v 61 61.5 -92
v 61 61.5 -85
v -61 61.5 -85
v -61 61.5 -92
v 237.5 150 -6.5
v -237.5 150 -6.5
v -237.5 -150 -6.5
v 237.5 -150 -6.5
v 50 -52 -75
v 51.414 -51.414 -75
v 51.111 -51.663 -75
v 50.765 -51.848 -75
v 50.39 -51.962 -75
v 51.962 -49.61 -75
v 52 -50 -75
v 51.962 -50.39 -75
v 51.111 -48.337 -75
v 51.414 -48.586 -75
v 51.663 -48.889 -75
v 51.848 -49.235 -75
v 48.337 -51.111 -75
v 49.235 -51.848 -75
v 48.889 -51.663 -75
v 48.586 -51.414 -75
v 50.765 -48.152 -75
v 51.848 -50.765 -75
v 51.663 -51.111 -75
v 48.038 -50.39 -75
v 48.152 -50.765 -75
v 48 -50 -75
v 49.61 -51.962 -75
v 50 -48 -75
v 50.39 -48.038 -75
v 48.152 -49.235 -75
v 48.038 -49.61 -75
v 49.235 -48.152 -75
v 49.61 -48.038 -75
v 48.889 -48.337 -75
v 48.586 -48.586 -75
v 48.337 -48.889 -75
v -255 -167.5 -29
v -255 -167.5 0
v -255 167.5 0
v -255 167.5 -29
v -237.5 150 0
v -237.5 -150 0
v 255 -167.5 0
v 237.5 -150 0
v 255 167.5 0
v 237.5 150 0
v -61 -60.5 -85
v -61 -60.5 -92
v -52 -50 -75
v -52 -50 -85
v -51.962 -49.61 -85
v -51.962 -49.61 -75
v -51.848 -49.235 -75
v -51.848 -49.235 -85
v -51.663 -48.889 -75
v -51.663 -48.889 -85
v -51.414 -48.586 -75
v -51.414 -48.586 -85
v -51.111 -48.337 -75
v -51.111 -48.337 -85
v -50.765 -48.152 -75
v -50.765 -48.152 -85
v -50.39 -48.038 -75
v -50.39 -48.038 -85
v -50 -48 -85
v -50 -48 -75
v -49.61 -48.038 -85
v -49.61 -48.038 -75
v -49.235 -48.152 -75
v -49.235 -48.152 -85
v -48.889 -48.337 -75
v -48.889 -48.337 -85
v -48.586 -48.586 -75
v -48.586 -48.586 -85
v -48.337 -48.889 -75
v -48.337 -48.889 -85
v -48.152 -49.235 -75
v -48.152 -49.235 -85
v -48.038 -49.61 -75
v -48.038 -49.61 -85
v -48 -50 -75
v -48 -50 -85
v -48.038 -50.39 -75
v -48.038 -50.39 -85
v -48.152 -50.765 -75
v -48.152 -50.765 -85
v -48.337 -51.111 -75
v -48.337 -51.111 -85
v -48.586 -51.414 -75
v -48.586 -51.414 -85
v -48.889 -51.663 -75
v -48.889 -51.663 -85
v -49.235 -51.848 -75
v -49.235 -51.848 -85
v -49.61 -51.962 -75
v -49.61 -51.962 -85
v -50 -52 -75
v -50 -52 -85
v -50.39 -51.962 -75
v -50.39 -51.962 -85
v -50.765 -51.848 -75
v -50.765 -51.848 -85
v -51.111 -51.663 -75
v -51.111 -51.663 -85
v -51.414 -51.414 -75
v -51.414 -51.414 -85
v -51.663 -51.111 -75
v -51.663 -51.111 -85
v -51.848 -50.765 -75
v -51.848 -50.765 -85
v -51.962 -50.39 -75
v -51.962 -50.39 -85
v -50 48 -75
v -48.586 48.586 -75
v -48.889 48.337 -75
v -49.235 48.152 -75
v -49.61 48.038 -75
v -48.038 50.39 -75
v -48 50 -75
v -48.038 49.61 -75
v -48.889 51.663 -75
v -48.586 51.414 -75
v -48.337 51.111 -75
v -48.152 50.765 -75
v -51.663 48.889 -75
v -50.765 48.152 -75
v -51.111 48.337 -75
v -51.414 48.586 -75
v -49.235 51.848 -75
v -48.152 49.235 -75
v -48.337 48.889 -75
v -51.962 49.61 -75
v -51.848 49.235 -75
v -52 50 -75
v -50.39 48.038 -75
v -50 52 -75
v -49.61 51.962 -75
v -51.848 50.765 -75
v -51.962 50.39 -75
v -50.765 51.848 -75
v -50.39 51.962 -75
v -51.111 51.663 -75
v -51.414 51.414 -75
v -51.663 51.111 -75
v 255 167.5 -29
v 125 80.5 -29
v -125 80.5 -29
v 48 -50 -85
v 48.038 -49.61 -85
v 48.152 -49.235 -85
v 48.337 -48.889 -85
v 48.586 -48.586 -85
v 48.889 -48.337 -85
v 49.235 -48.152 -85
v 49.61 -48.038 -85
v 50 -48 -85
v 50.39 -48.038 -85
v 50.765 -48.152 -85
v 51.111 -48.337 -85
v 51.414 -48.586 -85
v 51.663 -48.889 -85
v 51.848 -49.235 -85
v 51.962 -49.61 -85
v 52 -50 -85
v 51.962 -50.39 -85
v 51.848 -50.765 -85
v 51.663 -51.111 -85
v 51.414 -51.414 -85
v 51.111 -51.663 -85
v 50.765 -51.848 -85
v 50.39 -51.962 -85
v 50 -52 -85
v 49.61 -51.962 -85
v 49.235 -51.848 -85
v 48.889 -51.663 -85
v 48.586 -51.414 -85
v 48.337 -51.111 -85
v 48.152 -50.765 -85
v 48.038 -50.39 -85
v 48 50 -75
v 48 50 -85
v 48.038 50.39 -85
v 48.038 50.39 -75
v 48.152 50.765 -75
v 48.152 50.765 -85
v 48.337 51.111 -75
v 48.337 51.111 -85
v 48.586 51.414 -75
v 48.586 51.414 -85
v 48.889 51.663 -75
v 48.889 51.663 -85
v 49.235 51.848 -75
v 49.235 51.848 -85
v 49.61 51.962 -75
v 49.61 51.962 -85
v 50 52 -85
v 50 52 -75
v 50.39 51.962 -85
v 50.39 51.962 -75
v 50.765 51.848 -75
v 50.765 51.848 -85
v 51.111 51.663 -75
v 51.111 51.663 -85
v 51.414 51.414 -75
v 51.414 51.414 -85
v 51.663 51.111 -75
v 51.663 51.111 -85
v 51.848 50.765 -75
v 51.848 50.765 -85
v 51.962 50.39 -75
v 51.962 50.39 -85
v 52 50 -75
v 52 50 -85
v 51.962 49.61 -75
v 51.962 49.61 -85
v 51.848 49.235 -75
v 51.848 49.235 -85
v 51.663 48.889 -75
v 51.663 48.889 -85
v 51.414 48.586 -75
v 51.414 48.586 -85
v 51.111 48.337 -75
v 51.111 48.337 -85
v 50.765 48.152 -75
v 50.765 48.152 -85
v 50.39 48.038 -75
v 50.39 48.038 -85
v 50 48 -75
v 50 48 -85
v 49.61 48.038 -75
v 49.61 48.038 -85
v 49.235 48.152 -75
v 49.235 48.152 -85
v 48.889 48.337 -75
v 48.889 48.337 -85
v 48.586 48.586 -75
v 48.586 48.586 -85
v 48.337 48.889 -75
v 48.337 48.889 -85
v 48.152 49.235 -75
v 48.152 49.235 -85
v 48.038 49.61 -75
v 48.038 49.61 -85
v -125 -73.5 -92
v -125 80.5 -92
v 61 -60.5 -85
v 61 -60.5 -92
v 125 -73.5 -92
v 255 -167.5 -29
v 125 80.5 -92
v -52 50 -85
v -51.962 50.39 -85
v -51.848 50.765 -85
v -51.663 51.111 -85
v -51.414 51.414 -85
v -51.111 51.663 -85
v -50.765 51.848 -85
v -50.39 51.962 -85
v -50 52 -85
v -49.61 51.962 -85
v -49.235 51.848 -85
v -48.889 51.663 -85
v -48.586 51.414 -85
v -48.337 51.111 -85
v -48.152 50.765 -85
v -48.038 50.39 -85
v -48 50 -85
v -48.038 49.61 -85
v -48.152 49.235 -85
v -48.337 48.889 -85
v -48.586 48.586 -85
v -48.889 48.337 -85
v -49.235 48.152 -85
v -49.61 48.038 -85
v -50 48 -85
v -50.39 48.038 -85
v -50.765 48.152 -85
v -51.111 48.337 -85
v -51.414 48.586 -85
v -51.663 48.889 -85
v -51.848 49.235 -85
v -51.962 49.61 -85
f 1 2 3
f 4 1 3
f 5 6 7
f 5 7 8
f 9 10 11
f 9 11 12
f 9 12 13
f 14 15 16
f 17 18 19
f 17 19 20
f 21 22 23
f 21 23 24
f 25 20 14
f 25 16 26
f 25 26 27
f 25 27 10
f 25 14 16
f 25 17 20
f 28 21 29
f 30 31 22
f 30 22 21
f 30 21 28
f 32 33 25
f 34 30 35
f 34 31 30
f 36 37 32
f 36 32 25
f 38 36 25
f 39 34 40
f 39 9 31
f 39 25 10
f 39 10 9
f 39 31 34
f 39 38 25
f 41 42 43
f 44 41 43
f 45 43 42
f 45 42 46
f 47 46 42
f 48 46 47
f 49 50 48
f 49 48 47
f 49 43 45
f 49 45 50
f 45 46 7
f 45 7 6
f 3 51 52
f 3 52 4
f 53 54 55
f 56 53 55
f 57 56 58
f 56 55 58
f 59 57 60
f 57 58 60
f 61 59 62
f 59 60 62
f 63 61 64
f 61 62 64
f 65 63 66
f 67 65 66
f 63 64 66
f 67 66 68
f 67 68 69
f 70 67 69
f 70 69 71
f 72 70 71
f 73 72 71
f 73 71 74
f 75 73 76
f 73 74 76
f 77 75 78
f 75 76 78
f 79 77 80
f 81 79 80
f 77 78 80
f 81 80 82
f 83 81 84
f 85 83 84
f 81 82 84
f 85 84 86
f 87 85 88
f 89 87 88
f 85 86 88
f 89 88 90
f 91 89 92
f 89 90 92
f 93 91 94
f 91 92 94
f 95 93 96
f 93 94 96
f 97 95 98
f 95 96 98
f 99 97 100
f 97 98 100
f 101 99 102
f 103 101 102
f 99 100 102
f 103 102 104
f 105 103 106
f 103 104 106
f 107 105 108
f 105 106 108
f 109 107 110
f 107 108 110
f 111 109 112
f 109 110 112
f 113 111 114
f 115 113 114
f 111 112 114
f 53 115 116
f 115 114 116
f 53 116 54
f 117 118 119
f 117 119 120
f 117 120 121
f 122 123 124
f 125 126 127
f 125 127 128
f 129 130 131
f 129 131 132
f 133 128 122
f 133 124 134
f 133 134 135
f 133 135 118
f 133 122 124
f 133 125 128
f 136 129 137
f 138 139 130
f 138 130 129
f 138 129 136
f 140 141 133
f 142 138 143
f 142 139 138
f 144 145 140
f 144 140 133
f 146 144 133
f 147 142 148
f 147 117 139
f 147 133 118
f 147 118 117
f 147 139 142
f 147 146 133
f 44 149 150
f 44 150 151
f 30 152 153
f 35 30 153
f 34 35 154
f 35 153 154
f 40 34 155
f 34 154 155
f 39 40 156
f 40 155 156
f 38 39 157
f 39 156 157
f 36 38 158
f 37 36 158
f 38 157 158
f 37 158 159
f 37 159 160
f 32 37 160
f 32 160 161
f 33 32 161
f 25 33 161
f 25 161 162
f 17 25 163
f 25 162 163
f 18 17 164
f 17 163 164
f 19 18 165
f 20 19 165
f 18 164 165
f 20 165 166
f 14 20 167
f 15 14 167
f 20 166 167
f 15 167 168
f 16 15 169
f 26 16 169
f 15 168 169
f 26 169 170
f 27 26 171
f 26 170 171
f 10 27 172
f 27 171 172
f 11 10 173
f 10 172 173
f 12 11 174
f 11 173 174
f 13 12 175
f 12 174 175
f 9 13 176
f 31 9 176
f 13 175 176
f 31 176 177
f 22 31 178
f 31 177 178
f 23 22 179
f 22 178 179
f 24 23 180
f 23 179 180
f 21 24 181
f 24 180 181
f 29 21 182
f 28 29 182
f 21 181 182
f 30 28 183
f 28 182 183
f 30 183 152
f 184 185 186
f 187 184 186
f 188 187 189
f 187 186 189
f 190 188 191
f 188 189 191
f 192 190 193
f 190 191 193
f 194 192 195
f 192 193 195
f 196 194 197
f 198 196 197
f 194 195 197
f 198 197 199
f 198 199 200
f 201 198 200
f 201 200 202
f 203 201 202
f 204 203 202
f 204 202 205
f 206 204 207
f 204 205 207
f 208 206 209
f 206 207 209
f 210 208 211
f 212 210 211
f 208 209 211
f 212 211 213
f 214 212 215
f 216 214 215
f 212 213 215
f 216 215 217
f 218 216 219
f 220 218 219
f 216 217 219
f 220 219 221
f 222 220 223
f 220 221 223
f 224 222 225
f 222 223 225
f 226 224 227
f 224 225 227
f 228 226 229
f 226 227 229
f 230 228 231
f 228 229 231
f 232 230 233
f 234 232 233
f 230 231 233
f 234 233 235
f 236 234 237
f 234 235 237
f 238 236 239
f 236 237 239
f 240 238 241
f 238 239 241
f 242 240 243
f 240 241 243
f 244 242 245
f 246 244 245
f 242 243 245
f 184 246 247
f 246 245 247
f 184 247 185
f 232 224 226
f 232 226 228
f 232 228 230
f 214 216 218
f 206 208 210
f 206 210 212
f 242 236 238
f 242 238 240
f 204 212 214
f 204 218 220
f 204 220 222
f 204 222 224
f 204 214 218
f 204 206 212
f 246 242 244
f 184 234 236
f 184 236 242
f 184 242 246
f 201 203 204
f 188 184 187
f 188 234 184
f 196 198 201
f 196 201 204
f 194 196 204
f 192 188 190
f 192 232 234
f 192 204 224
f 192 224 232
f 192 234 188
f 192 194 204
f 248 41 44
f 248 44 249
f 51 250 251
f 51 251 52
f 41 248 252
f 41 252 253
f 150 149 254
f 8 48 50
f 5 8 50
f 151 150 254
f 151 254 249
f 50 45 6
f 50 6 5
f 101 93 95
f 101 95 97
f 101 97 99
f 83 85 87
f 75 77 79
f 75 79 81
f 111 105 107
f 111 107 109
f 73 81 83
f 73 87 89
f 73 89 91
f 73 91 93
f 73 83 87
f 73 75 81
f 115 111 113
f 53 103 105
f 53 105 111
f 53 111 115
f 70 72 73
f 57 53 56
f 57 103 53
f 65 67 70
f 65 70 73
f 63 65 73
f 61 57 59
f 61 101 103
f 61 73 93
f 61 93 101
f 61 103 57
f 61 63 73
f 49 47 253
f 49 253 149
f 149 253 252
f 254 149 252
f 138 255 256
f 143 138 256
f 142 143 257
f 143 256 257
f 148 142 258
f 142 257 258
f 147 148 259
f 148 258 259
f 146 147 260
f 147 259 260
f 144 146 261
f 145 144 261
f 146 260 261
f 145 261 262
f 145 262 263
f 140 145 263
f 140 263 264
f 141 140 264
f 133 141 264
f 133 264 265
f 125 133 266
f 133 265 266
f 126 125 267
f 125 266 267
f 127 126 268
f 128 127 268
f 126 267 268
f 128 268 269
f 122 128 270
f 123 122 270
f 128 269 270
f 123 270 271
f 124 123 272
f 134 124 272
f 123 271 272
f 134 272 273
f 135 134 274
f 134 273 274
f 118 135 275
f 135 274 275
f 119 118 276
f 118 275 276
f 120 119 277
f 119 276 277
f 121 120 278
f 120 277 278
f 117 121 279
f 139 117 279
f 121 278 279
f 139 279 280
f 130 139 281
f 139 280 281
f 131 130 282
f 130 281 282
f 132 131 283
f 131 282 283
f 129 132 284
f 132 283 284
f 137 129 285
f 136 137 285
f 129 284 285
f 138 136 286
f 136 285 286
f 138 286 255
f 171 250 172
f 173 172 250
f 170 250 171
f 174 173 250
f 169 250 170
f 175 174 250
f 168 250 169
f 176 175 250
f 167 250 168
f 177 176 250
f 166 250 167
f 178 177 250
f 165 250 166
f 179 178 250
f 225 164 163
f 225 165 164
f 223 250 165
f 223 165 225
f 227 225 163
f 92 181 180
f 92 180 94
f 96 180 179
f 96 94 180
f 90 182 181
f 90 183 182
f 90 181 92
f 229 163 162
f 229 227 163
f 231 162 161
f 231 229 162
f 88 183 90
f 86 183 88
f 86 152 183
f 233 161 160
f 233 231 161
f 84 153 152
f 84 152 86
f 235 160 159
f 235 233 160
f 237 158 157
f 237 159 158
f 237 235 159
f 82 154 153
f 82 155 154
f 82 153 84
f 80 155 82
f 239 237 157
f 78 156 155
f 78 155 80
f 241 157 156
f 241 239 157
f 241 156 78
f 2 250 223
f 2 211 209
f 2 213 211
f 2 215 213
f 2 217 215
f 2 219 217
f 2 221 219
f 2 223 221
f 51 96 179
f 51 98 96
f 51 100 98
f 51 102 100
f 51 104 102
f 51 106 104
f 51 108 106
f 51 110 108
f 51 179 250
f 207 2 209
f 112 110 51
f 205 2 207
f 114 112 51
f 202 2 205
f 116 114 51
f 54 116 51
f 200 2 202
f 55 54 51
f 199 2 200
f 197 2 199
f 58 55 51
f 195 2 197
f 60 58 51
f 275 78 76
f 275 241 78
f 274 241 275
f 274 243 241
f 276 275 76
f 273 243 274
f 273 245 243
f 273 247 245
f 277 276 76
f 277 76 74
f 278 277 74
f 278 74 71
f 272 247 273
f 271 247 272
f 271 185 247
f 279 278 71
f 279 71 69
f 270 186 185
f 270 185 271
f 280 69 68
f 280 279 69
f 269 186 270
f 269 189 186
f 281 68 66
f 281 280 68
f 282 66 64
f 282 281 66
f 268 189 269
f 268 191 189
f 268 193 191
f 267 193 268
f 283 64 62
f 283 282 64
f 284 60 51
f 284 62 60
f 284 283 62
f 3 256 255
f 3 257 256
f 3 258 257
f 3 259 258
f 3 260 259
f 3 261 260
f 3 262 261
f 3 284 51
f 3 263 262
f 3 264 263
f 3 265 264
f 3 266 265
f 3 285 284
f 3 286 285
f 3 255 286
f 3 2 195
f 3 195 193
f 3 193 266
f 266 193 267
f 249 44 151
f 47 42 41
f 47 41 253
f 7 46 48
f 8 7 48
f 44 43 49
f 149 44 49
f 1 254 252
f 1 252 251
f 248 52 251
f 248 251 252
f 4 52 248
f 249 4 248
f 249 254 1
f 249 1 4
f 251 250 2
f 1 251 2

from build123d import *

# Parameters (mm, degrees)
SKETCH1_W           = 510
SKETCH1_H           = 335
BOSS_EXTRUDE1_DEPTH = 29
SKETCH2_W           = 475
SKETCH2_H           = 300
CUT_EXTRUDE1_DEPTH  = 6.5
SKETCH3_W           = 122
SKETCH3_H           = 122
BOSS_EXTRUDE2_DEPTH = 56
SKETCH4_R           = 2
CUT_EXTRUDE2_DEPTH  = 10
BOSS_EXTRUDE3_START = -56
SKETCH5_W           = 250
SKETCH5_H           = 154
SKETCH5_W_2         = 122
SKETCH5_H_2         = 122
BOSS_EXTRUDE3_DEPTH = 63
BOSS_EXTRUDE4_REACH = 360.798
BOSS_EXTRUDE5_REACH = 379.454
CUT_EXTRUDE3_DEPTH  = 63


with BuildPart() as part:
    # Sketch1 → Boss-Extrude1 (new body)
    with BuildSketch(Plane.XY):
        Rectangle(SKETCH1_W, SKETCH1_H)
    extrude(amount=-BOSS_EXTRUDE1_DEPTH)

    # Sketch2 → Cut-Extrude1 (cut)
    with BuildSketch(Plane.XY):
        Rectangle(SKETCH2_W, SKETCH2_H)
    extrude(amount=-CUT_EXTRUDE1_DEPTH, mode=Mode.SUBTRACT)

    # Sketch3 → Boss-Extrude2 (add)
    with BuildSketch(Plane(origin=(0, 0, -29), x_dir=(-1, 0, 0), z_dir=(0, 0, -1))):
        with Locations((0, 0.5)):
            Rectangle(SKETCH3_W, SKETCH3_H)
    extrude(amount=BOSS_EXTRUDE2_DEPTH)

    # Sketch4 → Cut-Extrude2 (cut)
    with BuildSketch(Plane(origin=(0, 0, -85), x_dir=(-1, 0, 0), z_dir=(0, 0, -1))):
        with Locations((-50, 50)):
            Circle(SKETCH4_R)
        with Locations((50, 50)):
            Circle(SKETCH4_R)
        with Locations((50, -50)):
            Circle(SKETCH4_R)
        with Locations((-50, -50)):
            Circle(SKETCH4_R)
    extrude(amount=-CUT_EXTRUDE2_DEPTH, mode=Mode.SUBTRACT)

    # Sketch5 → Boss-Extrude3 (add)
    with BuildSketch(Plane(origin=(0, 0, -85), x_dir=(-1, 0, 0), z_dir=(0, 0, -1)).offset(BOSS_EXTRUDE3_START)):
        with Locations((0, 3.5)):
            Rectangle(SKETCH5_W, SKETCH5_H)
        with Locations((0, 0.5)):
            Rectangle(SKETCH5_W_2, SKETCH5_H_2, mode=Mode.SUBTRACT)
    extrude(amount=BOSS_EXTRUDE3_DEPTH)

    # Sketch7 → Boss-Extrude4 (add, up to next)
    with BuildSketch(Plane(origin=(0, -65.329597813, -97.475907848), x_dir=(1, 0, 0), z_dir=(0, 0.55673786293741, 0.8306882399383573)), mode=Mode.PRIVATE) as boss_extrude4_sk1:
        Polygon((255, -122.994882164), (125, -9.835702245), (-125, -9.835702245), (-255, -122.994882164), align=None)
    boss_extrude4_tool1 = extrude(boss_extrude4_sk1.sketch, amount=BOSS_EXTRUDE4_REACH, mode=Mode.PRIVATE) - part.part
    add(boss_extrude4_tool1.solids().sort_by_distance((0, -125.859649, -56.907895))[0])

    # Sketch8 → Boss-Extrude5 (add, up to next)
    with BuildSketch(Plane(origin=(-59.87852796, 0, -123.558867219), x_dir=(0.8998964379962335, 0, -0.4361036584135601), z_dir=(0.4361036584135601, 0, 0.8998964379962335)), mode=Mode.PRIVATE) as boss_extrude5_sk1:
        Polygon((-216.826585595, 167.5), (-216.826585595, -167.5), (-72.365518175, -73.5), (-72.365518175, 80.5), align=None)
    boss_extrude5_tool1 = extrude(boss_extrude5_sk1.sketch, amount=BOSS_EXTRUDE5_REACH, mode=Mode.PRIVATE) - part.part
    boss_extrude5 = boss_extrude5_tool1.solids().sort_by_distance((-198.019768, 1.534083, -56.613497))[0]
    add(boss_extrude5)

    # Sketch9 → Cut-Extrude3 (cut)
    with BuildSketch(Plane(origin=(0, 0, -92), x_dir=(-1, 0, 0), z_dir=(0, 0, -1))):
        Polygon((0, 167.5), (255, 167.5), (125, 80.5), (0, 80.5), align=None)
    cut_extrude3 = extrude(amount=-CUT_EXTRUDE3_DEPTH, mode=Mode.SUBTRACT)

    # Mirror1: Boss-Extrude5, Cut-Extrude3 across plane
    add(boss_extrude5.mirror(Plane(origin=(0, 0, 0), x_dir=(0, 0, 1), z_dir=(1, 0, 0))))
    add(cut_extrude3.mirror(Plane(origin=(0, 0, 0), x_dir=(0, 0, 1), z_dir=(1, 0, 0))), mode=Mode.SUBTRACT)


solid = part.part
